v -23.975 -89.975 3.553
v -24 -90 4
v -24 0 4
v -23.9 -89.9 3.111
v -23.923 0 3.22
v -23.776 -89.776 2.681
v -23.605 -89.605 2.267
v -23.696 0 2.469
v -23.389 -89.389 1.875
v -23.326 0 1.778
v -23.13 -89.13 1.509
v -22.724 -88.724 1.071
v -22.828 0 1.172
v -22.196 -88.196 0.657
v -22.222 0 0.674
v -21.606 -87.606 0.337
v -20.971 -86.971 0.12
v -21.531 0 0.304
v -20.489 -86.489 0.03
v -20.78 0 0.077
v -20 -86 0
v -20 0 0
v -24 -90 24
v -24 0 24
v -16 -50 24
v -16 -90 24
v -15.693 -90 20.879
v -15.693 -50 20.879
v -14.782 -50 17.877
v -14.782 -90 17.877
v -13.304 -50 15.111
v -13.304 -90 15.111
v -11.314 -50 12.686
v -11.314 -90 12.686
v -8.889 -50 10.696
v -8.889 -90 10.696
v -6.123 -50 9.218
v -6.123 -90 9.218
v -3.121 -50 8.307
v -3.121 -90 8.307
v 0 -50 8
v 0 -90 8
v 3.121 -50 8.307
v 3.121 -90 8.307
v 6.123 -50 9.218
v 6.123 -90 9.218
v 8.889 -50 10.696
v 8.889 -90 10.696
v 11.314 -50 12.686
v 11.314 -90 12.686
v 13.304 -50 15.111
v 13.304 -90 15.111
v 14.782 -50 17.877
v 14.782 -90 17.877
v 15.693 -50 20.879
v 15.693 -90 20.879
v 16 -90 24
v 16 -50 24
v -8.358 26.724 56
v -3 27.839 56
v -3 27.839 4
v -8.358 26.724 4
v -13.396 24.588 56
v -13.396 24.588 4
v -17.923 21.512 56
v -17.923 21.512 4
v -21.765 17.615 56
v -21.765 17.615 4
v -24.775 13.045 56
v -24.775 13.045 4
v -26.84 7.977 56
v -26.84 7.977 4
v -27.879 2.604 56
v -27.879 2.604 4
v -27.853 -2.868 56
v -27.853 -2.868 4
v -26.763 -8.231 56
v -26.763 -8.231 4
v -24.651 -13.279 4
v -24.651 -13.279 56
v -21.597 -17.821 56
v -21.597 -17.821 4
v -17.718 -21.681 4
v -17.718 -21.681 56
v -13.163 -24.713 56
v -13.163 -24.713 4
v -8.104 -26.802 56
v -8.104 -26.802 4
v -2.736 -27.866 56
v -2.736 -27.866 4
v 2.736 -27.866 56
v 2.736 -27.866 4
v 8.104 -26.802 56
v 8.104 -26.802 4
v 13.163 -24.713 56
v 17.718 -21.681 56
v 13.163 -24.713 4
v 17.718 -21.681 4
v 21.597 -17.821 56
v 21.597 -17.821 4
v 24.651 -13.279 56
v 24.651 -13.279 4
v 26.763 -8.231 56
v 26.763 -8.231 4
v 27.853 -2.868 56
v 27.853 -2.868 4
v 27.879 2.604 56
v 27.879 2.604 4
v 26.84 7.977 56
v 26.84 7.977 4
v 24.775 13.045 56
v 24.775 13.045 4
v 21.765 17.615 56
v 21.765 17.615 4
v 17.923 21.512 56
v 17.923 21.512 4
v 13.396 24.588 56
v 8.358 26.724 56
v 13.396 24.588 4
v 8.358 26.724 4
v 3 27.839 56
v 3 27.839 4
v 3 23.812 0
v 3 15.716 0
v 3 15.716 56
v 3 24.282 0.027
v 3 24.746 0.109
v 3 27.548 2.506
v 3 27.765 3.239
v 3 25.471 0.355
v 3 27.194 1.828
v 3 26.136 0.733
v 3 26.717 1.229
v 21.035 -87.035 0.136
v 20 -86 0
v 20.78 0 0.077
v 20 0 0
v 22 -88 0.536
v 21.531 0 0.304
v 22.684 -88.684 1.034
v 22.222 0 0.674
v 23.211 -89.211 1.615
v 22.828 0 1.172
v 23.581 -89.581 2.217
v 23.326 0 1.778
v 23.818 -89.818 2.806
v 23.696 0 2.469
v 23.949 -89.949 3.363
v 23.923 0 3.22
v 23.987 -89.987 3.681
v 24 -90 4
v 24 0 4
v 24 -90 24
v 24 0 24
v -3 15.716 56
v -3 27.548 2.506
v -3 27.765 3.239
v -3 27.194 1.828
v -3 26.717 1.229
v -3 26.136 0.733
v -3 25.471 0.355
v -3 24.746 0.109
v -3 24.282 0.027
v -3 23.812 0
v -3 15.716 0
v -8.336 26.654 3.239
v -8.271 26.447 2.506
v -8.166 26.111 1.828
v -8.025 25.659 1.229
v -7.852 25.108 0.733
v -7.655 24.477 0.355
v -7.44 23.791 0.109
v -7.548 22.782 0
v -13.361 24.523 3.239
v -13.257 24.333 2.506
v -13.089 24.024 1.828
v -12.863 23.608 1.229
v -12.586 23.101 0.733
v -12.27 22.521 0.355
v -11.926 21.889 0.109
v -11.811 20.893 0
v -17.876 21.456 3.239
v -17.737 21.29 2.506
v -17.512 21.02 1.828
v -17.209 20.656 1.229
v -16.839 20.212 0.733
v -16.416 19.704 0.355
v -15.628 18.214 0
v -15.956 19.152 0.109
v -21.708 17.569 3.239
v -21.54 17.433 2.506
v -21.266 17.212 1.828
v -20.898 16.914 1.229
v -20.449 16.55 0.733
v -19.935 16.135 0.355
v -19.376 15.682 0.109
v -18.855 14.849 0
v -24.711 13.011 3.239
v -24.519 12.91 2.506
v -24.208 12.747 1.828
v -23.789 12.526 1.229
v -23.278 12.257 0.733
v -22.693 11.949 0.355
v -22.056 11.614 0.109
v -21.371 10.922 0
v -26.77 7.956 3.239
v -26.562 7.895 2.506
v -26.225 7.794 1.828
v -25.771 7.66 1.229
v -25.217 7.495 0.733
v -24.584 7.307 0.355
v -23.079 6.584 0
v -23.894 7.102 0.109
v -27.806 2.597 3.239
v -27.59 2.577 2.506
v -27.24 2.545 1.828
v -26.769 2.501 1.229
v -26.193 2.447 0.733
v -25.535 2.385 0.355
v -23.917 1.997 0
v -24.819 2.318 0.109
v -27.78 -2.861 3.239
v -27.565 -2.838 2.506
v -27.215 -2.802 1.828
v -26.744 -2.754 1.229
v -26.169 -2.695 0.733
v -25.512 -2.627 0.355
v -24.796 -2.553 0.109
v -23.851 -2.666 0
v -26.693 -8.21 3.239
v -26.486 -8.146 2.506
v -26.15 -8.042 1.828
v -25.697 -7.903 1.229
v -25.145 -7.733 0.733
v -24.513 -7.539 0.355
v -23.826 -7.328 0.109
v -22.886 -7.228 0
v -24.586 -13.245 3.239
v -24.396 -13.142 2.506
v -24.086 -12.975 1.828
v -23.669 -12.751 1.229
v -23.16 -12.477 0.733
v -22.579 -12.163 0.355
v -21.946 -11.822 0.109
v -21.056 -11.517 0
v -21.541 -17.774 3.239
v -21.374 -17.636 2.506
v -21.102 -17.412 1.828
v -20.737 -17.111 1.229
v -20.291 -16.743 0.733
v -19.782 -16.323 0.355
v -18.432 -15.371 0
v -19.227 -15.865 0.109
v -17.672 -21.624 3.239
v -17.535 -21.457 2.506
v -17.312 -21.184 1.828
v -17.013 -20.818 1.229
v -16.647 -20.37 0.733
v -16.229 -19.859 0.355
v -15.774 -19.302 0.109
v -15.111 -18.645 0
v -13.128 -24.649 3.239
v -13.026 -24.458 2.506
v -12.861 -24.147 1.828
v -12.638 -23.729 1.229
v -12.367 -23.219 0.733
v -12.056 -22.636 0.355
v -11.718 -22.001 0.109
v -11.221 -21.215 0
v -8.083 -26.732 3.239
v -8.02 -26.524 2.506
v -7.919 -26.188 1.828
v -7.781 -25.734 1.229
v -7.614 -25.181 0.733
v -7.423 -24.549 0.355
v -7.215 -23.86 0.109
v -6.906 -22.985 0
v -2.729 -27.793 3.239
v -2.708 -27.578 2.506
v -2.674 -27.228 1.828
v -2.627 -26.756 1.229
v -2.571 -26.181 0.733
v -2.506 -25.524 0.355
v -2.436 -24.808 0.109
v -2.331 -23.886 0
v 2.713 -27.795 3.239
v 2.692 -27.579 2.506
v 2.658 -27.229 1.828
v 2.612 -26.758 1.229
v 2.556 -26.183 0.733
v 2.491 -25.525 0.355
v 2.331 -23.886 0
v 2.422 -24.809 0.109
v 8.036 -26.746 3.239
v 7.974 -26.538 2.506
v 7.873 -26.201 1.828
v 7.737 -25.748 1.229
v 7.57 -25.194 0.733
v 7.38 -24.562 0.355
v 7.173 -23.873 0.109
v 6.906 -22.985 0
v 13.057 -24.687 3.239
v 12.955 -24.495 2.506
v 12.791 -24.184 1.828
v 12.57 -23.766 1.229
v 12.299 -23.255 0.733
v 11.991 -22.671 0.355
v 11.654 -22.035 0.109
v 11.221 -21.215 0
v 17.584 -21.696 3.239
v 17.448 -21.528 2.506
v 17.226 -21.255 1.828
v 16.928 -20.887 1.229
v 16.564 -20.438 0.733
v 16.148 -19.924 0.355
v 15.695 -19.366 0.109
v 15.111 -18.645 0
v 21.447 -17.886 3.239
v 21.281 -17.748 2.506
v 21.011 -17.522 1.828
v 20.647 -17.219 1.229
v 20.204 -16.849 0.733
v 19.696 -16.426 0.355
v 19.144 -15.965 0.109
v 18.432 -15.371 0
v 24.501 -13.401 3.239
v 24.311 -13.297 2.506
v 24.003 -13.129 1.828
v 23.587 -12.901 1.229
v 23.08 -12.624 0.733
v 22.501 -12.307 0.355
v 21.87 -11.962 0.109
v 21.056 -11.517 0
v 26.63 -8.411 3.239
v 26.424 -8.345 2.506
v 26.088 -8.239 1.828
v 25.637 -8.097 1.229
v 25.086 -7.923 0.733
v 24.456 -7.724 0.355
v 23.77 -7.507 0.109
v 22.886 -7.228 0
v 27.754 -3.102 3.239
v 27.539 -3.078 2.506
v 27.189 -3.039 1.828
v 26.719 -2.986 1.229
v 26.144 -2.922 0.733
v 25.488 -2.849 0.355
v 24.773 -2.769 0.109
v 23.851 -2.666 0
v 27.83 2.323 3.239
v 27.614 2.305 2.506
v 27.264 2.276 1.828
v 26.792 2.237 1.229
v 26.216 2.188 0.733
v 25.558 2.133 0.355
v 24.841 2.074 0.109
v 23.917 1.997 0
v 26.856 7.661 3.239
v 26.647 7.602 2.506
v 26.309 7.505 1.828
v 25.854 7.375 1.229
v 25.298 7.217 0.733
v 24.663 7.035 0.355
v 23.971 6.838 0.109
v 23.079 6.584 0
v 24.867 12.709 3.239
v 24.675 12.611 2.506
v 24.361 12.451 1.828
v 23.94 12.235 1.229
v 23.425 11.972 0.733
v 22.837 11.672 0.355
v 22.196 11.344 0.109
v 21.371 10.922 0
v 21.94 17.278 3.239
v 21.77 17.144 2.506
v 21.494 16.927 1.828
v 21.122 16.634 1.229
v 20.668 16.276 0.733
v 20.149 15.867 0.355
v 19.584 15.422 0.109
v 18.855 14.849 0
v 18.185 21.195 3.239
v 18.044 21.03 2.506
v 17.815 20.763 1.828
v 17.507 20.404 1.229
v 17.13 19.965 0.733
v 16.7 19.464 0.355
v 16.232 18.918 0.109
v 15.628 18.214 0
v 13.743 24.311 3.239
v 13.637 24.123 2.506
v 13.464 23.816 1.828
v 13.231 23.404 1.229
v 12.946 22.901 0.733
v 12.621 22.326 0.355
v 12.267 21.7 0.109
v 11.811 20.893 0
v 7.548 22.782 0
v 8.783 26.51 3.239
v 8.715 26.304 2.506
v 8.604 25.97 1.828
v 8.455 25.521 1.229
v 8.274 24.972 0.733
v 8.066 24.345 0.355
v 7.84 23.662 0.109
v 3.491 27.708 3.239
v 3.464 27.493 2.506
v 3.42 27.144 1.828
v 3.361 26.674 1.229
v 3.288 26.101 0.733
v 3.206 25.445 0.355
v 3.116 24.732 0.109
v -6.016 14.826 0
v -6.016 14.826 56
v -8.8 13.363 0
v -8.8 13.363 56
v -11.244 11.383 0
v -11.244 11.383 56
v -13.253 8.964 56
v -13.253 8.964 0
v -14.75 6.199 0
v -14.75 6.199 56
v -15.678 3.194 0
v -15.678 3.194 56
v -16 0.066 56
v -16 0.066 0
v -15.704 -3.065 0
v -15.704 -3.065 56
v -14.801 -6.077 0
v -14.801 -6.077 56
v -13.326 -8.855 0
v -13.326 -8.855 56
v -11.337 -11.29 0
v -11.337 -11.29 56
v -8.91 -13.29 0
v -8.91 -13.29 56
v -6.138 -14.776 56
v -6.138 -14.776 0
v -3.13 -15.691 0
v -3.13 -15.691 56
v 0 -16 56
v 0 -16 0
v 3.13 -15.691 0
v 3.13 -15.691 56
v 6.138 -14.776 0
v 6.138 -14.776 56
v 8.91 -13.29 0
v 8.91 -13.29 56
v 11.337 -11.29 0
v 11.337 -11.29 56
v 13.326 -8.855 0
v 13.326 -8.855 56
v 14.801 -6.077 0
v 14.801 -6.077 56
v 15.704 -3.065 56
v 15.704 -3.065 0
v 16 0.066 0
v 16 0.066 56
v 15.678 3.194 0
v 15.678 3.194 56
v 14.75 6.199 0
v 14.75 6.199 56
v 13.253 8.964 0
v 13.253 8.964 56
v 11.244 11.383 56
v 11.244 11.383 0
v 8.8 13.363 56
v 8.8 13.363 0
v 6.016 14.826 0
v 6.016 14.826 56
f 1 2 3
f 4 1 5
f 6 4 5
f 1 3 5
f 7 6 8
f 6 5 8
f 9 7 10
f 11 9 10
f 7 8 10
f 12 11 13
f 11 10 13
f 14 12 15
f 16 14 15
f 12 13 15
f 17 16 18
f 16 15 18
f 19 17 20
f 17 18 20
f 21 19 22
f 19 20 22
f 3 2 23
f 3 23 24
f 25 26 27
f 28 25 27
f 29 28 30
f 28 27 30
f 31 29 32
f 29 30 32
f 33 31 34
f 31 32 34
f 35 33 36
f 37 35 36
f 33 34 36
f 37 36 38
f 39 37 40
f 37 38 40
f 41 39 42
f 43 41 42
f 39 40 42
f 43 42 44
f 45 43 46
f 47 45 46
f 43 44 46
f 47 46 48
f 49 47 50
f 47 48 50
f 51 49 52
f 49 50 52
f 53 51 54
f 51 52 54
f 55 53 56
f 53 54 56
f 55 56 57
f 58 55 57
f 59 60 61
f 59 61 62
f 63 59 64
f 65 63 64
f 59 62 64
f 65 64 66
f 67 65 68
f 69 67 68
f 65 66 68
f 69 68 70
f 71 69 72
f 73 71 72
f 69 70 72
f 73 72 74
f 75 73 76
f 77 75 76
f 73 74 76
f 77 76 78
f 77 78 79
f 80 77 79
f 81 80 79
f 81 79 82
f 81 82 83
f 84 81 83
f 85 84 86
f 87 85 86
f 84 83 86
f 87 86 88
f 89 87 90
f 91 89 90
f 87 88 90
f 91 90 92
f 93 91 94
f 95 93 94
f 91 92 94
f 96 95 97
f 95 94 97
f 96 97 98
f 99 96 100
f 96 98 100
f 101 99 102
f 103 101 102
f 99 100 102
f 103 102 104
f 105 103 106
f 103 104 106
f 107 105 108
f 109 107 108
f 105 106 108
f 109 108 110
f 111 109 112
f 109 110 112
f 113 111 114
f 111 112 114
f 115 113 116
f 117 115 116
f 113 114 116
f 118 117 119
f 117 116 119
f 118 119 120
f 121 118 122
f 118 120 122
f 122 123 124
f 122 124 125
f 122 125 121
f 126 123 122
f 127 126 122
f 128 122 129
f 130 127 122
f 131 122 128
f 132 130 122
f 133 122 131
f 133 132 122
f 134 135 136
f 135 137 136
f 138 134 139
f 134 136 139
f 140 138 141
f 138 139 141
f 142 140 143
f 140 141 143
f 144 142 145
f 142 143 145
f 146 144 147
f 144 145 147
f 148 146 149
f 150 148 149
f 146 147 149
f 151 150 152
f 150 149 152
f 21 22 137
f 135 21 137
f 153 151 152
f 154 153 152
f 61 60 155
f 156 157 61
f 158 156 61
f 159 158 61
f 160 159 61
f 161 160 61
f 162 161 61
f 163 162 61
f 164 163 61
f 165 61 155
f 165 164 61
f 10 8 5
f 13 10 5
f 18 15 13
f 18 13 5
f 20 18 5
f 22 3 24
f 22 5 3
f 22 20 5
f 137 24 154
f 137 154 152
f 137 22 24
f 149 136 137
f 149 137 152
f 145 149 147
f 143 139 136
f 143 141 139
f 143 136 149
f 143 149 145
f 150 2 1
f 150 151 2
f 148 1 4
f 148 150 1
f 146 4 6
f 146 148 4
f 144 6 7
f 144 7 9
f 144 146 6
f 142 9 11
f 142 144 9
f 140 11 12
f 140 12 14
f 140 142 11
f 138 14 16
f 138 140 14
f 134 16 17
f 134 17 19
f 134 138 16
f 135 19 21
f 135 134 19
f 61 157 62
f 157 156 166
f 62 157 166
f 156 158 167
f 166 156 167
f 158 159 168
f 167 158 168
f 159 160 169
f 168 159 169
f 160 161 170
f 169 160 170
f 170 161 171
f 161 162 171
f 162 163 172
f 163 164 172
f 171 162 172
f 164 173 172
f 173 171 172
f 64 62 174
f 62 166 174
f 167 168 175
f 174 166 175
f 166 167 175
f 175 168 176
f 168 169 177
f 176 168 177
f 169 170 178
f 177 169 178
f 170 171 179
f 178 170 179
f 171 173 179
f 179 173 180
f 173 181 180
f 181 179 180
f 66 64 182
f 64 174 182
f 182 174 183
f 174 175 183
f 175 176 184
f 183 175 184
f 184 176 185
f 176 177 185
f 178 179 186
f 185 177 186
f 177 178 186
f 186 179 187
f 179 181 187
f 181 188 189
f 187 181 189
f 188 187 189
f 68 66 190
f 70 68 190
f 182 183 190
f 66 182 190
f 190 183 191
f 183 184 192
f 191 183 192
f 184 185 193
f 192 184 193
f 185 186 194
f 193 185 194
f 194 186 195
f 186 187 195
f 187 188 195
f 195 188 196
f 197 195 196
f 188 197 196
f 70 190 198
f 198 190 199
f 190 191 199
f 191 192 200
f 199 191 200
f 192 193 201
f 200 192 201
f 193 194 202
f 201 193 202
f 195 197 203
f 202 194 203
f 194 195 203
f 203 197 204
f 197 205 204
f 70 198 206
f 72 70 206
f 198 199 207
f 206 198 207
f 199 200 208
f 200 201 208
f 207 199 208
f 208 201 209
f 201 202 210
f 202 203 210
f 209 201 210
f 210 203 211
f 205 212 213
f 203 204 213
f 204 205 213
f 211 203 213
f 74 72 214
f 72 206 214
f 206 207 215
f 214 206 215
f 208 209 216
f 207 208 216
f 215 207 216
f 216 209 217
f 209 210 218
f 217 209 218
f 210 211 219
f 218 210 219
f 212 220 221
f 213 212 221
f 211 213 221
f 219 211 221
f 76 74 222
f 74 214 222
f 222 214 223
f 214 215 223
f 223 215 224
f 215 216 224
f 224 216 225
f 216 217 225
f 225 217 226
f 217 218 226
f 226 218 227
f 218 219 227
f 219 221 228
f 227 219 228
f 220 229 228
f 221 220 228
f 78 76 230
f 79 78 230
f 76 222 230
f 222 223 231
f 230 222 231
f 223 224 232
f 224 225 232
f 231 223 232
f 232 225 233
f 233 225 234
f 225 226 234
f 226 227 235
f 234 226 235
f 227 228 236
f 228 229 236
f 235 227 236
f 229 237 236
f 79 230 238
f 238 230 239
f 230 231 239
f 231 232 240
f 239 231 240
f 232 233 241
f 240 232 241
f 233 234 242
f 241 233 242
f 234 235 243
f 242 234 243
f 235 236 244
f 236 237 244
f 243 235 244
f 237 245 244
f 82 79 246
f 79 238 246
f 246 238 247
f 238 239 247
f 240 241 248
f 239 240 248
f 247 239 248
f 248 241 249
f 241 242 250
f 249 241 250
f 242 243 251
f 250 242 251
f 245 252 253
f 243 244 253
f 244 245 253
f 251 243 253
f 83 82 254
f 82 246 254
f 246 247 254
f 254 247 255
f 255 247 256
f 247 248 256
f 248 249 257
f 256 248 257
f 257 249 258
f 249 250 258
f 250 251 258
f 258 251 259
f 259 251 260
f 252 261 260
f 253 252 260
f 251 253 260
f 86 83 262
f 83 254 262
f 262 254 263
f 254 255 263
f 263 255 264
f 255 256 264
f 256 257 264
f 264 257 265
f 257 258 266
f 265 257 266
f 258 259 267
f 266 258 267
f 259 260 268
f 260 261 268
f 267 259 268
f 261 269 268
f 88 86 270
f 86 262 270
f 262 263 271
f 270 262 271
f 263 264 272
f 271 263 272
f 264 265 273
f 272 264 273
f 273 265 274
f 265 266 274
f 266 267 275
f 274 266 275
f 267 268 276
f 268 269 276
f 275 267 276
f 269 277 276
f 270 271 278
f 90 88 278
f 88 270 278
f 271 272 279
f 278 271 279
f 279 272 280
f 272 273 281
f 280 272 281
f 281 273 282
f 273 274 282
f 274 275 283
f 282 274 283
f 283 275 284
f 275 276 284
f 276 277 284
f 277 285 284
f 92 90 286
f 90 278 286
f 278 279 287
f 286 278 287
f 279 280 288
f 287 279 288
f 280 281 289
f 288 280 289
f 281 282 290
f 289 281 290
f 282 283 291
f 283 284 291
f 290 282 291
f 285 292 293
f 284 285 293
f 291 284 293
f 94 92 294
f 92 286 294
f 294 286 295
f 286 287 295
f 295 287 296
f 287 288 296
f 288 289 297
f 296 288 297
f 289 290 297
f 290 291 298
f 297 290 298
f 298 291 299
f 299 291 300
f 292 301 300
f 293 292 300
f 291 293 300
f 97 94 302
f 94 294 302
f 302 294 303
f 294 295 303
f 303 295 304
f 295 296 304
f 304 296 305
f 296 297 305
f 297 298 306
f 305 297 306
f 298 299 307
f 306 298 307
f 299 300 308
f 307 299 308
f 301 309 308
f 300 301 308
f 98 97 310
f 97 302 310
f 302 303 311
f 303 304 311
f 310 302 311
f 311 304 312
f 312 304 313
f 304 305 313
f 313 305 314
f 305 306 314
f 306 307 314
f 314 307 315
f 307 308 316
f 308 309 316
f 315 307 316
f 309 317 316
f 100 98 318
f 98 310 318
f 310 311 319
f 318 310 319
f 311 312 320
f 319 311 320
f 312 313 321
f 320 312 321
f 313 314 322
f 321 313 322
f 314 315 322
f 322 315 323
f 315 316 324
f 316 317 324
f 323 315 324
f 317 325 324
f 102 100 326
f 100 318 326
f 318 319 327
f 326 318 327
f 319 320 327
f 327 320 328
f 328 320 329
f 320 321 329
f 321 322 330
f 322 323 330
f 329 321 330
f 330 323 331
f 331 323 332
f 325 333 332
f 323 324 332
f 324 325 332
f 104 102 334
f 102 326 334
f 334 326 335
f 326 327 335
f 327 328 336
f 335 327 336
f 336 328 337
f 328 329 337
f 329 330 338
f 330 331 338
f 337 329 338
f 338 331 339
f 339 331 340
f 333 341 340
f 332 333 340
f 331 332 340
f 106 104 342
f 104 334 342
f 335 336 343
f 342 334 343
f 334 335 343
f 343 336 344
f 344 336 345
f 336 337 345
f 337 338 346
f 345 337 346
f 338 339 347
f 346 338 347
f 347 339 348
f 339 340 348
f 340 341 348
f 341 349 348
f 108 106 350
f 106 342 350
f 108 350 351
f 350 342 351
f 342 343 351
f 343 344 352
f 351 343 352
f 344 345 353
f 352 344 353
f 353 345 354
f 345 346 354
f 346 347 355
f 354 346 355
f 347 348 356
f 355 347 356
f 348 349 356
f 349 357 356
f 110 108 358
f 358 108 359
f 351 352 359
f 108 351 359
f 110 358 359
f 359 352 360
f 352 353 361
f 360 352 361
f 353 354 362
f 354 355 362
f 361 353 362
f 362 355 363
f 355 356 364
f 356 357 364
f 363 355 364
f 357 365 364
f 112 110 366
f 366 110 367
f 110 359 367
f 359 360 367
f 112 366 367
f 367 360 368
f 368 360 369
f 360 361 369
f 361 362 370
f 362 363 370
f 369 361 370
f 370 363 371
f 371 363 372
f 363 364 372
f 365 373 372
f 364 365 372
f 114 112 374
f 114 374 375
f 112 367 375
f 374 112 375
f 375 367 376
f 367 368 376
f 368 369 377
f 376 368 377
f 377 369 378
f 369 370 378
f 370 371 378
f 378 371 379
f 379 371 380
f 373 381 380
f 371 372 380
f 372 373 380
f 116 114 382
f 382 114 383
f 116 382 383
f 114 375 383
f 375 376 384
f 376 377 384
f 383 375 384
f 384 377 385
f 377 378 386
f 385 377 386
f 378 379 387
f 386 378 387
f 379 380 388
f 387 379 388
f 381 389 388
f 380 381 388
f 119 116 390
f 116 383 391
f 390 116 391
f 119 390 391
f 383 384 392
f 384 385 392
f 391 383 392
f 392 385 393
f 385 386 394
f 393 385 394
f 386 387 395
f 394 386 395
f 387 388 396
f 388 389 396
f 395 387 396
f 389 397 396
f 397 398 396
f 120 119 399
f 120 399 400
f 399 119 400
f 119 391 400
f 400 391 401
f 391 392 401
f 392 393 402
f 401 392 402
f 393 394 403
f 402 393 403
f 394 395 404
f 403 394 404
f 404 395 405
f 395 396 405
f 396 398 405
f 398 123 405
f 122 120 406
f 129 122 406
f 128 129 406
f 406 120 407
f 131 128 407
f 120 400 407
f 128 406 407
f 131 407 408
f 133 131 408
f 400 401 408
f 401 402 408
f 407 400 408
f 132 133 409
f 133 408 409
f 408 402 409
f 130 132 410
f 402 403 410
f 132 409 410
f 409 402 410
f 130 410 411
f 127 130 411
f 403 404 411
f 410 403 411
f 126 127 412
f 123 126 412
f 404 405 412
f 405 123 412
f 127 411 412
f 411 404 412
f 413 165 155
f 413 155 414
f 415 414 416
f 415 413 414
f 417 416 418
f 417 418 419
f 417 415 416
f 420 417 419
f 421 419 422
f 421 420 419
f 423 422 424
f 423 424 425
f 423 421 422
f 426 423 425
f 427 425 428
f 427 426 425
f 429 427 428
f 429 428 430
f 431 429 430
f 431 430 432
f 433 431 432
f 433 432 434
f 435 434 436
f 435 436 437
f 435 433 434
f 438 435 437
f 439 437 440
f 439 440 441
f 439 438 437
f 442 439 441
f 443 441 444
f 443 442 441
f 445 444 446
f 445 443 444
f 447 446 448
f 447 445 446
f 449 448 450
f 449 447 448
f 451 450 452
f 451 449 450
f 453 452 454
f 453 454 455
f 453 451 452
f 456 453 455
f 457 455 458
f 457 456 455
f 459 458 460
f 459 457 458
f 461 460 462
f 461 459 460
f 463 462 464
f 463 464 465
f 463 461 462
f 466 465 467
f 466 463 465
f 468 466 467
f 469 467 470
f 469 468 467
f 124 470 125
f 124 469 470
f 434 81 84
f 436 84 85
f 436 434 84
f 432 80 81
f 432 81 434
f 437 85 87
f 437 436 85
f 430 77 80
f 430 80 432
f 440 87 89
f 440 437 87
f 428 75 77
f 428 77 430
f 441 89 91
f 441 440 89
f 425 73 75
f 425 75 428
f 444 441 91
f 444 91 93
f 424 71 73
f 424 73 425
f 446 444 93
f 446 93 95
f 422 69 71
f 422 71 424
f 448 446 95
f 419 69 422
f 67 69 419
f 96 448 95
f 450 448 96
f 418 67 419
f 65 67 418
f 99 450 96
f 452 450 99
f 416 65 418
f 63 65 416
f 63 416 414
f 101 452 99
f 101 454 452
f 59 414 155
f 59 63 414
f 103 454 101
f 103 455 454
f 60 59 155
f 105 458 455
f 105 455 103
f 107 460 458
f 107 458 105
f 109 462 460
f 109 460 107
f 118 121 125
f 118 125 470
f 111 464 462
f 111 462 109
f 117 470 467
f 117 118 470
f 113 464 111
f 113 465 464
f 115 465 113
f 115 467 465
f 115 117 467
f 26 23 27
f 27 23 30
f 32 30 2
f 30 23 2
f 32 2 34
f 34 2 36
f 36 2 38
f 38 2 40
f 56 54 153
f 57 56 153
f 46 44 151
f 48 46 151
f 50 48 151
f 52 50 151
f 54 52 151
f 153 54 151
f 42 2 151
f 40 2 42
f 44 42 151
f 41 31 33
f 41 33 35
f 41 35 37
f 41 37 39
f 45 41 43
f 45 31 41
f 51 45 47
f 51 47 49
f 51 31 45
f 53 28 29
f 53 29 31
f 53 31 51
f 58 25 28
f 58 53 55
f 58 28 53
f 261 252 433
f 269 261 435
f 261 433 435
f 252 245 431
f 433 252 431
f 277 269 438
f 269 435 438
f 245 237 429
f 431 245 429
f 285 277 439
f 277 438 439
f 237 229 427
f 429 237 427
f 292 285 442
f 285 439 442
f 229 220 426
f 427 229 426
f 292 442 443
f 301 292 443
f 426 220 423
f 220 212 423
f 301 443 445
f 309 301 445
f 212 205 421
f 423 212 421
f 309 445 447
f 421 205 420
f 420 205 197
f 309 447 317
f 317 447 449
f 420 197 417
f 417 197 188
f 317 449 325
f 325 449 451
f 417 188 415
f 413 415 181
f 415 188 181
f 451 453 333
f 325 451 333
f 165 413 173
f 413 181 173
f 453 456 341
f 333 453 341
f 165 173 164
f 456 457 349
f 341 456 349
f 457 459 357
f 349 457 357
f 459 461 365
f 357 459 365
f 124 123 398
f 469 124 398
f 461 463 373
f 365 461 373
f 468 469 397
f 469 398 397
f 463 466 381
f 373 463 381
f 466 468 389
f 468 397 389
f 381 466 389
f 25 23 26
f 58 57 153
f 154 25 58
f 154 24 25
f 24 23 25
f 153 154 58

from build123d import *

# Parameters (mm, degrees)
PAD_DEPTH    = 56
FILLET_R     = 4
SKETCH001_W  = 48
SKETCH001_H  = 90
PAD001_DEPTH = 24
SKETCH002_R  = 16
POCKET_DEPTH = 40
FILLET001_R  = 4


with BuildPart() as fillet_body:
    # Sketch → Pad (new body)
    with BuildSketch(Plane.XY):
        with BuildLine():
            ThreePointArc((-3, 27.838822), (0, -28), (3, 27.838822))
            Line((3, 15.716234), (3, 27.838822))
            ThreePointArc((-3, 15.716234), (0, -16), (3, 15.716234))
            Line((-3, 27.838822), (-3, 15.716234))
        make_face()
    extrude(amount=PAD_DEPTH)

    # Fillet
    fillet_edges = [fillet_body.edges().sort_by_distance(p)[0] for p in [
        (0, -28, 0),
    ]]
    fillet(fillet_edges, radius=FILLET_R)


with BuildPart() as fillet001:
    # Sketch001 → Pad001 (new body)
    with BuildSketch(Plane.XY):
        with Locations((0, -45)):
            Rectangle(SKETCH001_W, SKETCH001_H)
    extrude(amount=PAD001_DEPTH)

    # Sketch002 → Pocket (cut)
    with BuildSketch(Plane.XZ.offset(90)):
        with Locations((0, 24)):
            Circle(SKETCH002_R)
    extrude(amount=-POCKET_DEPTH, mode=Mode.SUBTRACT)

    # Fillet001
    fillet001_edges = [fillet001.edges().sort_by_distance(p)[0] for p in [
        (24, -45, 0),
        (0, -90, 0),
        (-24, -45, 0),
    ]]
    fillet(fillet001_edges, radius=FILLET001_R)


solid = Compound([fillet_body.part, fillet001.part])
